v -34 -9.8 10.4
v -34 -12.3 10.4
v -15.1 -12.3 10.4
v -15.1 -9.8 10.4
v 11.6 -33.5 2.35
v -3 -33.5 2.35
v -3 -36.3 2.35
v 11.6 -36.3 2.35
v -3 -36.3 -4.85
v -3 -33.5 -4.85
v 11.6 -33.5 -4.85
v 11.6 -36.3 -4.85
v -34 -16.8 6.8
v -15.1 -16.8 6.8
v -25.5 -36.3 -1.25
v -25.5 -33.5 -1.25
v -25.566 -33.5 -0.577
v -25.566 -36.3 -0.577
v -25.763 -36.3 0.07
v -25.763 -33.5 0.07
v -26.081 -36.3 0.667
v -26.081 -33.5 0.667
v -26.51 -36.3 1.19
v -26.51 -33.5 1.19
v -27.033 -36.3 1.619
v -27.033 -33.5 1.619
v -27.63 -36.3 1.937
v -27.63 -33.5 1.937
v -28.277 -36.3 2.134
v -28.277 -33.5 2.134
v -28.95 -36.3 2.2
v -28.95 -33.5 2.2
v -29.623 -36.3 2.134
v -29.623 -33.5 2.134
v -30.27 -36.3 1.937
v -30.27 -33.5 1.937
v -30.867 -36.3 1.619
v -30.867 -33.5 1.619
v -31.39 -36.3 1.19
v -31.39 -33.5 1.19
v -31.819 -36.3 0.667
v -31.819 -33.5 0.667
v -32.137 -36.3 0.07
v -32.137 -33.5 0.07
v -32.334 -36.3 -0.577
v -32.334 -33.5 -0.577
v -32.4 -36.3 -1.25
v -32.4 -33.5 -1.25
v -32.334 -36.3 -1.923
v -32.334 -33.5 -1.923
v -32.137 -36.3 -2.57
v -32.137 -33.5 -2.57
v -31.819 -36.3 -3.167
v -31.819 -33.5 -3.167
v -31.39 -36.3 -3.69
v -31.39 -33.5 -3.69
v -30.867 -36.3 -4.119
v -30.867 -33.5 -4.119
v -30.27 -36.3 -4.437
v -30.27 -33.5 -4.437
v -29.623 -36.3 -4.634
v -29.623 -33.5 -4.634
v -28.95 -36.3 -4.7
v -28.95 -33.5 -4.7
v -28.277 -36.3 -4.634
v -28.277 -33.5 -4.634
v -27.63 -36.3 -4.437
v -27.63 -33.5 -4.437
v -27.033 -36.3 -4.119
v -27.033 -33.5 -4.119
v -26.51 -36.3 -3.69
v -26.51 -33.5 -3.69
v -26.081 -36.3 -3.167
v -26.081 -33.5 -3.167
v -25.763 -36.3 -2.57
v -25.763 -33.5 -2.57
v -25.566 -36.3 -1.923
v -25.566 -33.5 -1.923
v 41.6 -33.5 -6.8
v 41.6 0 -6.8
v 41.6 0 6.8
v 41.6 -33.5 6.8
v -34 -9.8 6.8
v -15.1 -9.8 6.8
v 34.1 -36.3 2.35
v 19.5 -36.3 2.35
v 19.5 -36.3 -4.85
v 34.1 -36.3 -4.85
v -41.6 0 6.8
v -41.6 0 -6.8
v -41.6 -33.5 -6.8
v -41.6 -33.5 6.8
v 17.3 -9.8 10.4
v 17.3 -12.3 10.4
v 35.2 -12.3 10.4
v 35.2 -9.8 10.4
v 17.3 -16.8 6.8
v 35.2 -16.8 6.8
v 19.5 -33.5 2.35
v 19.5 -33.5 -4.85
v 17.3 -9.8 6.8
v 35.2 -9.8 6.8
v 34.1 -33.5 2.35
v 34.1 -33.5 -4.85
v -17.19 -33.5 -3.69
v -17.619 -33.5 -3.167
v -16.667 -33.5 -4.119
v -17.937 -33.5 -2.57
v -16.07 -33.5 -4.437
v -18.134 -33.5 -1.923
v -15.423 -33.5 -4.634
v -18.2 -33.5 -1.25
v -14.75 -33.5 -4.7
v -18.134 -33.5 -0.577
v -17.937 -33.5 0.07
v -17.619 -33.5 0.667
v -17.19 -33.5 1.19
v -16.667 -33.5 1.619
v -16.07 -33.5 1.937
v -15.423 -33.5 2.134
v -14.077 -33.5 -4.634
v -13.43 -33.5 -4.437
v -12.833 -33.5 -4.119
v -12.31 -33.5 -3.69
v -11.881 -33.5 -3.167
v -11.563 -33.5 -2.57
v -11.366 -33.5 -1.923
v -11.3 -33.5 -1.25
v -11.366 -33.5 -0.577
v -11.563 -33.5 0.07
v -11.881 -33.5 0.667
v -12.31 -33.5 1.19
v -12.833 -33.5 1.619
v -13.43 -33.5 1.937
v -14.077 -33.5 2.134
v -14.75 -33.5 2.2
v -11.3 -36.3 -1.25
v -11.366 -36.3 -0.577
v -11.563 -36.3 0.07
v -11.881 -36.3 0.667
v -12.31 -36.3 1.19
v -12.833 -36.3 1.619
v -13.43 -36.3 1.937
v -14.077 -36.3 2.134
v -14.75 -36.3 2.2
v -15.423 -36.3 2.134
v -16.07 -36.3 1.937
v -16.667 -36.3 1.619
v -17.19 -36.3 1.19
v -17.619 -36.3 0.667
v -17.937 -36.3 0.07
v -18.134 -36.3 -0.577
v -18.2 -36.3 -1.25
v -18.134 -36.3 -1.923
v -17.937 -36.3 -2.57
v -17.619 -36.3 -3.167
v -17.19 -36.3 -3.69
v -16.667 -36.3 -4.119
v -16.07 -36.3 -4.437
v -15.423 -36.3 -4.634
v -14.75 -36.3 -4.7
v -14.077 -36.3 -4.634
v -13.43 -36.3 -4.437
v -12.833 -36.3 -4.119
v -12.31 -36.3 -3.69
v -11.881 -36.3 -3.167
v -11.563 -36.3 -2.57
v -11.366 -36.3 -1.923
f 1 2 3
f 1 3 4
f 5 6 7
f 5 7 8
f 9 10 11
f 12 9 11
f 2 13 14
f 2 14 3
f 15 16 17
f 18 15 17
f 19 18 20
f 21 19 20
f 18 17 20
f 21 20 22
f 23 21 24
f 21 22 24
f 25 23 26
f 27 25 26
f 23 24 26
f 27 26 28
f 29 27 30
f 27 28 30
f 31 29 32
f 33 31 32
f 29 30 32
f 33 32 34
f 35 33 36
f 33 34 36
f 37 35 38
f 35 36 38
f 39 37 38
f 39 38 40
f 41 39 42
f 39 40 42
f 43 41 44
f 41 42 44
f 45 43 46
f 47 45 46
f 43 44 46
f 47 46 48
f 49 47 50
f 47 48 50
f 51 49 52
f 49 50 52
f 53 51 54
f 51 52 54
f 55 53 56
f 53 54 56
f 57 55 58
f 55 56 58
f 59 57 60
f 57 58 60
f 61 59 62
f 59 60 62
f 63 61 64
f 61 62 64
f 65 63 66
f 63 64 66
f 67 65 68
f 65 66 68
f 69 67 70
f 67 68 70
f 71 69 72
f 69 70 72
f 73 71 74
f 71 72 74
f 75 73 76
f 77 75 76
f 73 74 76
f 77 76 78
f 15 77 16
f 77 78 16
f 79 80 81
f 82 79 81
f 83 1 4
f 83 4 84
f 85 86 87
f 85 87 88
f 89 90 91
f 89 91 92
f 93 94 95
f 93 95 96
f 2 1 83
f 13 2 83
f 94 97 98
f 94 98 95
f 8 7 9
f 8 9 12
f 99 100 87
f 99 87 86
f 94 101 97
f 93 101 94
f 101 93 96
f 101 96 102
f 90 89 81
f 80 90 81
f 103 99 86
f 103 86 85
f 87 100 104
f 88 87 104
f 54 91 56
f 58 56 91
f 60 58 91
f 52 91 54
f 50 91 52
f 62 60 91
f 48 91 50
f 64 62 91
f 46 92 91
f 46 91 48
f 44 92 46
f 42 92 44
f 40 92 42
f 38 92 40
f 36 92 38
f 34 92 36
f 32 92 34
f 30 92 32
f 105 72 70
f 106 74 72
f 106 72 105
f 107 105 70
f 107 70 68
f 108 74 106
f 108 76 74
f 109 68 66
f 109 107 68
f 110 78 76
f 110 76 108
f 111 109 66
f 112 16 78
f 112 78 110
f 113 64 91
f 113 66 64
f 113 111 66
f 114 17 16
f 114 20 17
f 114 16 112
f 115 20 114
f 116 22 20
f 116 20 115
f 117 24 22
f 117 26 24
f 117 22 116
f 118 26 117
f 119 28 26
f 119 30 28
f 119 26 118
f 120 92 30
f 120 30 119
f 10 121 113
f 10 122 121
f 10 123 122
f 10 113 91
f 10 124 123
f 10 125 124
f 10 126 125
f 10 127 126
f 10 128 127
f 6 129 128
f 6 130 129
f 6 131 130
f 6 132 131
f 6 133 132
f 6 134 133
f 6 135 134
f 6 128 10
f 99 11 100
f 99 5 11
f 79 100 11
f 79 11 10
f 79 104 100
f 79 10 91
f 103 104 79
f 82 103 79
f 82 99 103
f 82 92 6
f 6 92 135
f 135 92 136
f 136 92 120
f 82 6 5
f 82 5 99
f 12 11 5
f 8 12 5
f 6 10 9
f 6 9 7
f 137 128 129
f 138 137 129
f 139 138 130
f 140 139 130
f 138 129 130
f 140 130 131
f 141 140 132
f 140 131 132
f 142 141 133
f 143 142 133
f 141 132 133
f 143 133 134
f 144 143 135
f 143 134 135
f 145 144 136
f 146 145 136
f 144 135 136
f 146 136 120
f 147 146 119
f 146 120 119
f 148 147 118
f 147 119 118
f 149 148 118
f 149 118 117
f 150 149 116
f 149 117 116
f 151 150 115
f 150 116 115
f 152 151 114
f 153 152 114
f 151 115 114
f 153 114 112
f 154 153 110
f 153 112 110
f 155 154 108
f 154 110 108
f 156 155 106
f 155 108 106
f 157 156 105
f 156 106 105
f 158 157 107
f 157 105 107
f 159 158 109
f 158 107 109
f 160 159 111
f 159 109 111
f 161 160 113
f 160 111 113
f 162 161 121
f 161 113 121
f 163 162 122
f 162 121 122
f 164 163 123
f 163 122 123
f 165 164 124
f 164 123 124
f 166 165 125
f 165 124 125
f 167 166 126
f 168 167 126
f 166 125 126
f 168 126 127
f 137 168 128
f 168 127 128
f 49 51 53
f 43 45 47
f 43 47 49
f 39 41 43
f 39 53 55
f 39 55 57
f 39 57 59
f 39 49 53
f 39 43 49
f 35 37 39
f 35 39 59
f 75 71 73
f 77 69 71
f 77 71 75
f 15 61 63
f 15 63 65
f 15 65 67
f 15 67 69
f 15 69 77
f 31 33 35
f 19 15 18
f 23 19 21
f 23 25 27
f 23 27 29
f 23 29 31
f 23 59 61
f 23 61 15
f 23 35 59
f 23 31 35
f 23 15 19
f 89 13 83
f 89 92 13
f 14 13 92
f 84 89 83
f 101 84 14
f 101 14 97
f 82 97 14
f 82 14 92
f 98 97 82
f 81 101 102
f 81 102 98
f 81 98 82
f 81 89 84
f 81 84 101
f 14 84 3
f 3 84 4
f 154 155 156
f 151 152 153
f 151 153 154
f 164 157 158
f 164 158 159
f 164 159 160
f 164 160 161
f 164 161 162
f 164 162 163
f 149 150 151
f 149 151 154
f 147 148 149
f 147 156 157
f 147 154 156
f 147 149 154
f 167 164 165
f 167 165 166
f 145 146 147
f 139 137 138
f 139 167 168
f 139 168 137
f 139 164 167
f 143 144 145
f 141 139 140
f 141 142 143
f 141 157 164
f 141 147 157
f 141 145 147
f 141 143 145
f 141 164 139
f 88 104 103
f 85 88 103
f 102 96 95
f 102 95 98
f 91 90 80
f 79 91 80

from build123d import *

# Parameters (mm, degrees)
F0_W     = 83.2
F0_H     = 13.6
F1_DEPTH = 33.5
F4_DEPTH = 69.2
F5_W     = 32.4
F5_H     = 3.6
F6_DEPTH = 8
F7_R     = 3.45
F7_W     = 14.6
F7_H     = 7.2
F8_DEPTH = 2.8


with BuildPart() as f1:
    # F0 (on Front) → F1 (new body)
    with BuildSketch(Plane.XZ):
        Rectangle(F0_W, F0_H)
    extrude(amount=F1_DEPTH)

    # F3 (on offset) → F4 (join)
    with BuildSketch(Plane(origin=(-34, 0, 0), x_dir=(0, -1, 0), z_dir=(-1, 0, 0))):
        Polygon((9.8, 10.4), (9.8, 6.8), (16.8, 6.8), (12.3, 10.4), align=None)
    extrude(amount=-F4_DEPTH)

    # F5 (on face) → F6 (cut, up to face)
    with BuildSketch(Plane(origin=(0, -9.8, 0), x_dir=(-1, 0, 0), z_dir=(0, 1, 0))):
        with Locations((-1.1, 8.6)):
            Rectangle(F5_W, F5_H)
    extrude(amount=-F6_DEPTH, mode=Mode.SUBTRACT)

    # F7 (on face) → F8 (join)
    with BuildSketch(Plane.XZ.offset(33.5)):
        with Locations((-28.95, -1.25)):
            Circle(F7_R)
        with Locations((-14.75, -1.25)):
            Circle(F7_R)
        with Locations((4.3, -1.25)):
            Rectangle(F7_W, F7_H)
        with Locations((26.8, -1.25)):
            Rectangle(F7_W, F7_H)
    extrude(amount=F8_DEPTH)


solid = f1.part
